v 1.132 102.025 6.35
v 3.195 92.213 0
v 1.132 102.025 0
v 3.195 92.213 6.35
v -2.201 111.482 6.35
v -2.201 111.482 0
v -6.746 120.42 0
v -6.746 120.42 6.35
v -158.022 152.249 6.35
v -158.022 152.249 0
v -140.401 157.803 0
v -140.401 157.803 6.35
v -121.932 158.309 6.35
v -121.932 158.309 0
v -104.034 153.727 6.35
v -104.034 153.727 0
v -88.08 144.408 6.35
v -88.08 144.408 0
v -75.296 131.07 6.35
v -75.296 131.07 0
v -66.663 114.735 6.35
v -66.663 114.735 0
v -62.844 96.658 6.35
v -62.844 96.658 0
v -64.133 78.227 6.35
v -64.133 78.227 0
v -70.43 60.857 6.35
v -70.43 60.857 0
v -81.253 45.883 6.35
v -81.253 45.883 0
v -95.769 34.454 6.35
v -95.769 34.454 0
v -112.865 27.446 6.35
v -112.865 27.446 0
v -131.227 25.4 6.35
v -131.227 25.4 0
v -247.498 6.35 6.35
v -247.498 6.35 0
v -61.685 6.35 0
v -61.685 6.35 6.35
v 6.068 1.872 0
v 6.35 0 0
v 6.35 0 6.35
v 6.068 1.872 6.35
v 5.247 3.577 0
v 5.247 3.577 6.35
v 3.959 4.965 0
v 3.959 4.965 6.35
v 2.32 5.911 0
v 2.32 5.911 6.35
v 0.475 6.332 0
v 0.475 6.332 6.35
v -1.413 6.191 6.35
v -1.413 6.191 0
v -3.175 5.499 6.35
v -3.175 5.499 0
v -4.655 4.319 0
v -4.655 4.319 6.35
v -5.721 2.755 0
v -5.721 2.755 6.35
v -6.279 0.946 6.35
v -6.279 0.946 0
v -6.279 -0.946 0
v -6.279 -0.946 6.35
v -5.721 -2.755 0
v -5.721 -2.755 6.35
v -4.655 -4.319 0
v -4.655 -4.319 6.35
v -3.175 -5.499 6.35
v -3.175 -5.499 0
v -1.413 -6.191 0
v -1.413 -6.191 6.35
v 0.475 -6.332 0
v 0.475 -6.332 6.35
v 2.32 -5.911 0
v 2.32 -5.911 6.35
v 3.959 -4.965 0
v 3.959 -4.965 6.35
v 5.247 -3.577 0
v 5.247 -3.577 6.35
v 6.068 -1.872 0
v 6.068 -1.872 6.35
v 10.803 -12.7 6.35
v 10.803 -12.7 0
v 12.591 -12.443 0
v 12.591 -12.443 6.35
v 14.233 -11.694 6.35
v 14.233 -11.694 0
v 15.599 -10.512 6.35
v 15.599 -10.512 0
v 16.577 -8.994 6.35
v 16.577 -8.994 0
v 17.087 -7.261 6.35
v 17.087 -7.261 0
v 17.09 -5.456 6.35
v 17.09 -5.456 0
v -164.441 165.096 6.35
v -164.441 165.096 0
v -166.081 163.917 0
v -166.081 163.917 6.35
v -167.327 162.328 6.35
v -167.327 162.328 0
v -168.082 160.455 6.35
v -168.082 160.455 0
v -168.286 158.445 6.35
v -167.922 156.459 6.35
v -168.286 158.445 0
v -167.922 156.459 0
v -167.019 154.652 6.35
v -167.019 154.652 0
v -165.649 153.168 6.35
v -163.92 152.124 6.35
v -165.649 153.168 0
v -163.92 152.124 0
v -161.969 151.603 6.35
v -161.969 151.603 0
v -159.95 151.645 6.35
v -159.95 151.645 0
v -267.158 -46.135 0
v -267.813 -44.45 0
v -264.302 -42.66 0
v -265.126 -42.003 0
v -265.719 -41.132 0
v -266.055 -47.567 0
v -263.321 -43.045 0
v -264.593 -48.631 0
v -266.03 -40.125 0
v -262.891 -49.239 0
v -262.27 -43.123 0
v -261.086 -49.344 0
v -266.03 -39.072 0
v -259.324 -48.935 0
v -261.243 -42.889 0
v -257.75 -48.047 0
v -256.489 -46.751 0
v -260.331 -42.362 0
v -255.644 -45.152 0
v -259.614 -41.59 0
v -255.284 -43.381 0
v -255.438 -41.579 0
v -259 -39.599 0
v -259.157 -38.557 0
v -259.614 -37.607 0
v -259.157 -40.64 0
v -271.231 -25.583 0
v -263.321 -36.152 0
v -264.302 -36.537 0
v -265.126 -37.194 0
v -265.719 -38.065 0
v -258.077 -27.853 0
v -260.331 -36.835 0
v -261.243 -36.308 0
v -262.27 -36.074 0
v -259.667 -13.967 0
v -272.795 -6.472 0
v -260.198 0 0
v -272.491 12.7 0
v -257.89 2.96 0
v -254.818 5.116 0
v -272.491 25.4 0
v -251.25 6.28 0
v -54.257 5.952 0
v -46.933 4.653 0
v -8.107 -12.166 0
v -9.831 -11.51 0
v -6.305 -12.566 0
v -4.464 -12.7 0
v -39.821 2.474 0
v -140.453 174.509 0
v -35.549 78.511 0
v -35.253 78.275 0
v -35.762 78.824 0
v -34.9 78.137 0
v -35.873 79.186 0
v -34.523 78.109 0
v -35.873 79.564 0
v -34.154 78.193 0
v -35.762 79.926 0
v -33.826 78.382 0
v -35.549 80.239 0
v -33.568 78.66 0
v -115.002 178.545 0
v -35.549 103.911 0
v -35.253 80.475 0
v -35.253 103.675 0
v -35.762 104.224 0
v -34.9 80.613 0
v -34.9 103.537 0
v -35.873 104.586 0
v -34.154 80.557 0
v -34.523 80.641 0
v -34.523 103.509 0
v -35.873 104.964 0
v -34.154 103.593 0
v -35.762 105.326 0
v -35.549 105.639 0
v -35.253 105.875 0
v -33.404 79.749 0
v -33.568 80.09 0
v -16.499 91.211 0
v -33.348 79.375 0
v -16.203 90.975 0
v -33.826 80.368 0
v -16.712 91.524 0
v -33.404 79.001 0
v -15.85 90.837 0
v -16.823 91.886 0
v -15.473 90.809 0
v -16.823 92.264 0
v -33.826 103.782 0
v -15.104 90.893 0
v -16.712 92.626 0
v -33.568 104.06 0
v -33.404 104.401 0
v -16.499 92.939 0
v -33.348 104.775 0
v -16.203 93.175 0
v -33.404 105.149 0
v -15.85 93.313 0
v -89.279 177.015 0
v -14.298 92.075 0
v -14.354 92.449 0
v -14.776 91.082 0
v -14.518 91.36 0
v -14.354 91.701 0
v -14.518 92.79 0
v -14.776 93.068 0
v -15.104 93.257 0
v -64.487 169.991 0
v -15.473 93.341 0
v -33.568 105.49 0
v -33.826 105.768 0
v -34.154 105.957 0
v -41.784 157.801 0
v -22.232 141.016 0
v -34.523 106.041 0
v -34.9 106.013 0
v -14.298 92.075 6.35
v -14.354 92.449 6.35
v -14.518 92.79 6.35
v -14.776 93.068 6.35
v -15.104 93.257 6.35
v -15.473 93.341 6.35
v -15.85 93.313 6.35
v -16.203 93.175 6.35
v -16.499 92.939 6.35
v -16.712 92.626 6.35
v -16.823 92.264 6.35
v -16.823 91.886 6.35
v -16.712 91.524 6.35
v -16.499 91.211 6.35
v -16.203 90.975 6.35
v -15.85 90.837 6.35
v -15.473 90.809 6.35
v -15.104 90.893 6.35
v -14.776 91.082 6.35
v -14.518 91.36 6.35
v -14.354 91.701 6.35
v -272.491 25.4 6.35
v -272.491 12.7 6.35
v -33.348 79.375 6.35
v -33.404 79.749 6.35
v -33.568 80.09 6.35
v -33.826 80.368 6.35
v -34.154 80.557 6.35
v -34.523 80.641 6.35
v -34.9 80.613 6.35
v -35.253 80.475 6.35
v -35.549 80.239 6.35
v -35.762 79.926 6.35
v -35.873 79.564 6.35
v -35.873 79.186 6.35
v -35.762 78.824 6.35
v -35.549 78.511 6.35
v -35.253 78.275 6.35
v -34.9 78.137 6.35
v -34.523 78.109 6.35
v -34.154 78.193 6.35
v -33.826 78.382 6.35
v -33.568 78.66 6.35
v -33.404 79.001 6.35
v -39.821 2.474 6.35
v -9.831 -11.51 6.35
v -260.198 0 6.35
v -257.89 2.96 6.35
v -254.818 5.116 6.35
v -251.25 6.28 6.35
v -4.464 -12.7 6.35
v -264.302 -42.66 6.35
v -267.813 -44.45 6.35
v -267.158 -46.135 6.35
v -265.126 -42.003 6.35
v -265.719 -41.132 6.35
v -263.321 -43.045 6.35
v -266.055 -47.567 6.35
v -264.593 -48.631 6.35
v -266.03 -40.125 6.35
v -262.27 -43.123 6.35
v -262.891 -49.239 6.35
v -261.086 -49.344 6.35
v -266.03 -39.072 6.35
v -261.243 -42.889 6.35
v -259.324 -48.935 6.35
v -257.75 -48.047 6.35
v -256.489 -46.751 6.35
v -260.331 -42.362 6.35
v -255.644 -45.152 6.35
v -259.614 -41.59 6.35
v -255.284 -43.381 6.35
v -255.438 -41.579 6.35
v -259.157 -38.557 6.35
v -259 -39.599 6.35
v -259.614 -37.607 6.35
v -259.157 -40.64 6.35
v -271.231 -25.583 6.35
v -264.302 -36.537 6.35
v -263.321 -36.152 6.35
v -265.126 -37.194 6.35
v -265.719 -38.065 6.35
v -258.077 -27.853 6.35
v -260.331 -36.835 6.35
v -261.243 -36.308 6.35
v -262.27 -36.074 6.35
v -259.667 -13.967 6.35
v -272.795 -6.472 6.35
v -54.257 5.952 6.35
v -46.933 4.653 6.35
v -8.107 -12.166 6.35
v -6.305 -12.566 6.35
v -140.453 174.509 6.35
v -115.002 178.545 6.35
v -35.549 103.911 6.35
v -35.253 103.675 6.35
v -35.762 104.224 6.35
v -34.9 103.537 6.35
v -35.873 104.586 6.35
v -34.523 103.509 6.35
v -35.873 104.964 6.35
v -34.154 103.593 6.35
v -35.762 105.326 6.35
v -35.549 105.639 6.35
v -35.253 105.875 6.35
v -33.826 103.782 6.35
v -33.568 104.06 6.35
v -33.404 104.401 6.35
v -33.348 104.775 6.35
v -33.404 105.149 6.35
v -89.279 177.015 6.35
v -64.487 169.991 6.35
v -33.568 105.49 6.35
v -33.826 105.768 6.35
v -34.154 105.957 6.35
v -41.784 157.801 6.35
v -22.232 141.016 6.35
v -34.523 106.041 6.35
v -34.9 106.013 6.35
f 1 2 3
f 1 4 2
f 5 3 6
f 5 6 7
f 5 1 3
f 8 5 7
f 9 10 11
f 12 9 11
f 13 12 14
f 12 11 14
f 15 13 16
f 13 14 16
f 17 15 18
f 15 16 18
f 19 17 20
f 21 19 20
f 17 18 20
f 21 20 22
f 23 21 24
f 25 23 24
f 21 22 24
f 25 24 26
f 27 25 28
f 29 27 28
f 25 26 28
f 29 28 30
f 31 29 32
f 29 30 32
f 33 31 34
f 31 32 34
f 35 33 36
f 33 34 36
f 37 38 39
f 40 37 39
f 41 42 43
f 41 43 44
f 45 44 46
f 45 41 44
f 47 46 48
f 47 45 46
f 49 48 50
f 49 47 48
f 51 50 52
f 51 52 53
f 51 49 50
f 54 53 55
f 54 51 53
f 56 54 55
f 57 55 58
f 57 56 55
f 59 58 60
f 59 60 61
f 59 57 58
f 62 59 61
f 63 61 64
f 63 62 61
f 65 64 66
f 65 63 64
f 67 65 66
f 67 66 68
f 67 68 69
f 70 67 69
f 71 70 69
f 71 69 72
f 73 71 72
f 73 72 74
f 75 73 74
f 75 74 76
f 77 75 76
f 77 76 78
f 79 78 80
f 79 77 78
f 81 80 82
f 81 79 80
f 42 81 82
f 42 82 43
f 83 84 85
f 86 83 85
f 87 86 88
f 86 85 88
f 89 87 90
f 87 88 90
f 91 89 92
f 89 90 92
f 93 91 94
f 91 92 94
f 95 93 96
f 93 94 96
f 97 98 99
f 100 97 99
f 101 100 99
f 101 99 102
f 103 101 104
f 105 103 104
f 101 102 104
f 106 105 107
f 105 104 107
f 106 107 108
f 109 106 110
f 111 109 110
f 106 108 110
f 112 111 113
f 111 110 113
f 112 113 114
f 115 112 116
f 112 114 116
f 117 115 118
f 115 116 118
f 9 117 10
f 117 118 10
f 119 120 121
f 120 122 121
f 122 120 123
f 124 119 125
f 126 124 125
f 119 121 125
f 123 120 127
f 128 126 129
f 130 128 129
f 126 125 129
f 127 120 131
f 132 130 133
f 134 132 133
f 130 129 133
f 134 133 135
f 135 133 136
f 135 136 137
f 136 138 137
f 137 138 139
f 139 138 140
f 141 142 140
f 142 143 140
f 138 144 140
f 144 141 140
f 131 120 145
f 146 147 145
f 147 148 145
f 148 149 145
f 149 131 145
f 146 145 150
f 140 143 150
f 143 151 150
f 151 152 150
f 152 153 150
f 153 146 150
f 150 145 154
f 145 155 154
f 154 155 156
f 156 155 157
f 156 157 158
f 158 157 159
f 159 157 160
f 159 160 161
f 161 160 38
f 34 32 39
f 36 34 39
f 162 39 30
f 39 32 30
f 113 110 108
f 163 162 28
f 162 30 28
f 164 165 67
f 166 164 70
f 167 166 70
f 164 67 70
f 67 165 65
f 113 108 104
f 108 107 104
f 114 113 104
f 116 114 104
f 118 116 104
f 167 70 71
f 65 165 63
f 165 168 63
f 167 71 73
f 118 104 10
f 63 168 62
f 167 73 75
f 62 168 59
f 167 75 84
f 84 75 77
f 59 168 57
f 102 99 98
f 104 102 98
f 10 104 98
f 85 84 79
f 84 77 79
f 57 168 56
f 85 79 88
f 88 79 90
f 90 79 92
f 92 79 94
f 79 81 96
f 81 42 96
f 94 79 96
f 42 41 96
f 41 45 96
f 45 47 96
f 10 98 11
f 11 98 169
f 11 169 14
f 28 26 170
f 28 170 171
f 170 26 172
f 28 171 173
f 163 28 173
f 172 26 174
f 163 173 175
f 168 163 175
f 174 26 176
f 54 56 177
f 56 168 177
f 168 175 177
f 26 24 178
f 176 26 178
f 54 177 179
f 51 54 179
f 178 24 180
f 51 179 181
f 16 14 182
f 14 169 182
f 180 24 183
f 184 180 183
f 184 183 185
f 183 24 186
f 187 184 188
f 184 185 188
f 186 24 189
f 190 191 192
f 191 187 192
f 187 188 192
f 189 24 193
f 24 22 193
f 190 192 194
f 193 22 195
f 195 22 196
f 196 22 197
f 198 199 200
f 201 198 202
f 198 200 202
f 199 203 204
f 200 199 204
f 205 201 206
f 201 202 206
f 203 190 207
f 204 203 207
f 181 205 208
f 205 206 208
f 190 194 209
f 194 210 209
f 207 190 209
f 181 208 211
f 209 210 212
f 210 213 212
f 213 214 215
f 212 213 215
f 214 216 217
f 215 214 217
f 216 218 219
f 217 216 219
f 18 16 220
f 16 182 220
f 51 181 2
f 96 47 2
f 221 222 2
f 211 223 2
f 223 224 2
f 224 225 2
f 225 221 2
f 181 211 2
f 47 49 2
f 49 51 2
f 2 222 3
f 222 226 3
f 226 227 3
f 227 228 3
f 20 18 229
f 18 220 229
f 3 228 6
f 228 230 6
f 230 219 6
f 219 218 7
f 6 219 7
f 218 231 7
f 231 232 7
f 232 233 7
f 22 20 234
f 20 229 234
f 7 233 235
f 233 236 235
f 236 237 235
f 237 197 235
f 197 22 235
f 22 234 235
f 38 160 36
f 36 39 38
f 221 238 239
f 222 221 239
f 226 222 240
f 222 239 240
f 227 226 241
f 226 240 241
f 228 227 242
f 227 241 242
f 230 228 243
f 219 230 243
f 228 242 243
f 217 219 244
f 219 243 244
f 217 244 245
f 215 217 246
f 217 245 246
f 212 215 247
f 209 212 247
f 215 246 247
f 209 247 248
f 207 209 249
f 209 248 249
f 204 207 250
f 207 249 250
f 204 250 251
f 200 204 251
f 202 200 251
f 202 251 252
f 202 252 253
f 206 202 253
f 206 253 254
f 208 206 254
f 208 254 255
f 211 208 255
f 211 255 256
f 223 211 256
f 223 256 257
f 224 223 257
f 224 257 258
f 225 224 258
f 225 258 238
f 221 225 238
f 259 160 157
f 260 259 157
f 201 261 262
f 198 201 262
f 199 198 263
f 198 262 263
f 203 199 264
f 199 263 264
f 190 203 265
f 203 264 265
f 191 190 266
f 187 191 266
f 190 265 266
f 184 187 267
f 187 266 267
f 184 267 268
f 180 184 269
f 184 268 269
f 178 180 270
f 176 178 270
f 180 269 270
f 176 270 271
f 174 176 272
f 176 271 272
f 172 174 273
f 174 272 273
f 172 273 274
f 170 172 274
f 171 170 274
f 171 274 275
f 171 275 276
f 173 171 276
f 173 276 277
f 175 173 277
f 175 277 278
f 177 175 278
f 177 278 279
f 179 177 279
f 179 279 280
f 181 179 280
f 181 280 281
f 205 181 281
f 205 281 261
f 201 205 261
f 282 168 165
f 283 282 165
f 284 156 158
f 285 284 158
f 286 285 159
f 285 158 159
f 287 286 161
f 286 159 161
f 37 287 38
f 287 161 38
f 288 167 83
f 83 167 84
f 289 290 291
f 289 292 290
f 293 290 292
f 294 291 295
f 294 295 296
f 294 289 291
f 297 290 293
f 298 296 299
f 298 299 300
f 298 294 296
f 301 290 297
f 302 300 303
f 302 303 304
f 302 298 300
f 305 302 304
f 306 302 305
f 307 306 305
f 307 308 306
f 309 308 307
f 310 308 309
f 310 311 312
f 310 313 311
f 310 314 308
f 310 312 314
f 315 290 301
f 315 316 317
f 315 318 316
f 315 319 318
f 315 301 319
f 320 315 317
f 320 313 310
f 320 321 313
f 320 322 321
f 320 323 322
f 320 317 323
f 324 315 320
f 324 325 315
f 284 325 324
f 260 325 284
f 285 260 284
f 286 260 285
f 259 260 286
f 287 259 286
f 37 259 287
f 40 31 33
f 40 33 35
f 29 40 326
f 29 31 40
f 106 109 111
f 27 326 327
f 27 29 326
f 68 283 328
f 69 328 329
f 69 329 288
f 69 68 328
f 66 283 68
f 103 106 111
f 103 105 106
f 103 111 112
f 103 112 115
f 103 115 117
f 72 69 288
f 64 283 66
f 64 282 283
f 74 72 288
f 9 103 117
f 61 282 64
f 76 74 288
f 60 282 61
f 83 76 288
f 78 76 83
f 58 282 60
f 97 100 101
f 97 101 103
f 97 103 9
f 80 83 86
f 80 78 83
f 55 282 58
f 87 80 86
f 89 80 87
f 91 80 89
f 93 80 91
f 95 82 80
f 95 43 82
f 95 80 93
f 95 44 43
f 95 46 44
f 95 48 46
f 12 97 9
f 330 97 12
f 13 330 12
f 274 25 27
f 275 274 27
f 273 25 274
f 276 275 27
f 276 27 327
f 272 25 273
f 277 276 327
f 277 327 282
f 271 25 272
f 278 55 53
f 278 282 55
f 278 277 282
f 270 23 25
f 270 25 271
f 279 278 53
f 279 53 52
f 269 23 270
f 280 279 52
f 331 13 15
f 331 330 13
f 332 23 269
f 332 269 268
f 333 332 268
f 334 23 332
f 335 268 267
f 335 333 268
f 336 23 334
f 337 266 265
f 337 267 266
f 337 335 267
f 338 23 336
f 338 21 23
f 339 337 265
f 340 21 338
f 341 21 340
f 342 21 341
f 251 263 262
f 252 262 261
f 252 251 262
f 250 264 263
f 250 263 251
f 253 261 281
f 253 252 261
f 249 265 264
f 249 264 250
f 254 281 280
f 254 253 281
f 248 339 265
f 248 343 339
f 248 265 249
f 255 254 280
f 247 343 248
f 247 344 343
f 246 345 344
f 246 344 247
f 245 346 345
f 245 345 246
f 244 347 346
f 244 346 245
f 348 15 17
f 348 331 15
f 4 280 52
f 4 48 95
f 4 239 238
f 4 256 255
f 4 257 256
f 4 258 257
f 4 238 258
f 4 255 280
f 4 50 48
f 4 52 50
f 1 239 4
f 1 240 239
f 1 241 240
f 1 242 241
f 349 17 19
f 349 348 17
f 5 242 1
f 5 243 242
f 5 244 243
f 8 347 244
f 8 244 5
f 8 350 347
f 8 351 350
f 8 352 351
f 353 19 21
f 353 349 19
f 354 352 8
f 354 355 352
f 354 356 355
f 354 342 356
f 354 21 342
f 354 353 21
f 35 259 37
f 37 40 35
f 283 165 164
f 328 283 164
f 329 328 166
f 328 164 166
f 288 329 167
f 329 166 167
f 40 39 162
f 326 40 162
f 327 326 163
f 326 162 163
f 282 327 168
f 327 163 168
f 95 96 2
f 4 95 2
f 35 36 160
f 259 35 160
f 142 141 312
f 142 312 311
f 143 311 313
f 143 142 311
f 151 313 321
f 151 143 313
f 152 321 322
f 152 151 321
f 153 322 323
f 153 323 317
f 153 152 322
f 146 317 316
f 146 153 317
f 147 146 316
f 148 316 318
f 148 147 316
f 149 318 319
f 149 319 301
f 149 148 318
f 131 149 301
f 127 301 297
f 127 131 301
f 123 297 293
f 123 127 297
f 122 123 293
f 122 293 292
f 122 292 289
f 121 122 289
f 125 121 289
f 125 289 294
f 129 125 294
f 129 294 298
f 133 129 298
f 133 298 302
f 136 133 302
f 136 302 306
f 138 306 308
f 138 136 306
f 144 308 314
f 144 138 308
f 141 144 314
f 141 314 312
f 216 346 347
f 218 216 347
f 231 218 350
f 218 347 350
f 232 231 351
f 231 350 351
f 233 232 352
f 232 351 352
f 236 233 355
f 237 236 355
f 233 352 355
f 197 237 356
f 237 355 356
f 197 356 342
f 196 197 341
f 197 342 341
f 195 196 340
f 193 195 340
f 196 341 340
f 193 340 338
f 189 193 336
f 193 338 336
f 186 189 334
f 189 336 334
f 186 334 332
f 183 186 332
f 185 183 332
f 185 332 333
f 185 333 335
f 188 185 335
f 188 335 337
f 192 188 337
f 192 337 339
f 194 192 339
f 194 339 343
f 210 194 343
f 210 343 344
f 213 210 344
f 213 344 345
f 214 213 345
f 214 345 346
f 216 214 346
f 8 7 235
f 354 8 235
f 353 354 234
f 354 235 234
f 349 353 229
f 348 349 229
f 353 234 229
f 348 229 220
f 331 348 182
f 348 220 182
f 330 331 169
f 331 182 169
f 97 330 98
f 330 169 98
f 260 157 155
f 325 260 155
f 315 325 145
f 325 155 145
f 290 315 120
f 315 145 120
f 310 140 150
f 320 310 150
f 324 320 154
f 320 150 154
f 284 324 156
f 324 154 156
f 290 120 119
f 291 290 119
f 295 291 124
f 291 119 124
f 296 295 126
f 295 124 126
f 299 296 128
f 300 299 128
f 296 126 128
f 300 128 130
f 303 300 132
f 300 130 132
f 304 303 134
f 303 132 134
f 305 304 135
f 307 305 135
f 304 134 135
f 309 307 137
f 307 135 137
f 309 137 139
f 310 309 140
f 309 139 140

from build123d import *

# Parameters (mm, degrees)
SKETCH12_R          = 3.534772165
SKETCH12_R_2        = 6.35
BOSS_EXTRUDE1_DEPTH = 6.35
FILLET1_R           = 76.2
CUT_EXTRUDE1_REACH  = 328.259
SKETCH13_R          = 1.27


with BuildPart() as part:
    # Sketch12 → Boss-Extrude1 (new body)
    with BuildSketch(Plane.XY):
        with BuildLine():
            Line((-39.821029206, 2.474307267), (-9.831351966, -11.510108895))
            ThreePointArc((-9.831351966, -11.510108895), (-7.212883139, -12.39895929), (-4.464100042, -12.7))
            Line((-4.464100042, -12.7), (10.803041567, -12.7))
            ThreePointArc((10.803041567, -12.7), (15.59897105, -10.511917874), (17.089739091, -5.455609571))
            Line((17.089739091, -5.455609571), (1.595718556, 103.452331978))
            ThreePointArc((1.595718556, 103.452331978), (-67.699436665, 171.237030889), (-164.440692675, 165.095912987))
            ThreePointArc((-164.440692675, 165.095912987), (-167.534473509, 155.523319718), (-158.02225004, 152.248624859))
            ThreePointArc((-158.02225004, 152.248624859), (-64.124270807, 105.829190753), (-131.226727106, 25.4))
            Line((-131.226727106, 25.4), (-272.4912, 25.4))
            Line((-272.4912, 25.4), (-272.4912, 12.7))
            ThreePointArc((-272.4912, 12.7), (-272.246013191, -16.046367487), (-267.813472119, -44.45))
            ThreePointArc((-267.813472119, -44.45), (-260.190367935, -49.202291704), (-255.438076231, -41.579187519))
            ThreePointArc((-255.438076231, -41.579187519), (-259.003846596, -20.925354843), (-260.1976, 0))
            ThreePointArc((-260.1976, 0), (-254.817926624, 5.115653247), (-247.4976, 6.35))
            Line((-247.4976, 6.35), (-61.685028221, 6.35))
            ThreePointArc((-61.685028221, 6.35), (-50.5754306, 5.414040325), (-39.821029206, 2.474307267))
        make_face()
        with Locations((-262.5344, -39.5986)):
            Circle(SKETCH12_R, mode=Mode.SUBTRACT)
        Circle(SKETCH12_R_2, mode=Mode.SUBTRACT)
    extrude(amount=BOSS_EXTRUDE1_DEPTH)

    # Fillet1
    fillet1_edges = [part.edges().sort_by_distance(p)[0] for p in [
        (1.595718556, 103.452331978, 3.175),
    ]]
    fillet(fillet1_edges, radius=FILLET1_R)

    # Sketch13 → Cut-Extrude1 (cut, up to next)
    with BuildSketch(Plane.XY.offset(6.35), mode=Mode.PRIVATE) as cut_extrude1_sk1:
        with Locations((-15.567641436, 92.075)):
            Circle(SKETCH13_R)
    cut_extrude1_tool1 = extrude(cut_extrude1_sk1.sketch, amount=-CUT_EXTRUDE1_REACH, mode=Mode.PRIVATE) & part.part
    # Sketch13 → Cut-Extrude1 (cut, up to next)
    with BuildSketch(Plane.XY.offset(6.35), mode=Mode.PRIVATE) as cut_extrude1_sk2:
        with Locations((-34.617641436, 104.775)):
            Circle(SKETCH13_R)
    cut_extrude1_tool2 = extrude(cut_extrude1_sk2.sketch, amount=-CUT_EXTRUDE1_REACH, mode=Mode.PRIVATE) & part.part
    # Sketch13 → Cut-Extrude1 (cut, up to next)
    with BuildSketch(Plane.XY.offset(6.35), mode=Mode.PRIVATE) as cut_extrude1_sk3:
        with Locations((-34.617641436, 79.375)):
            Circle(SKETCH13_R)
    cut_extrude1_tool3 = extrude(cut_extrude1_sk3.sketch, amount=-CUT_EXTRUDE1_REACH, mode=Mode.PRIVATE) & part.part
    add(cut_extrude1_tool1.solids().sort_by_distance((-15.567641, 92.075, 6.35))[0], mode=Mode.SUBTRACT)
    add(cut_extrude1_tool2.solids().sort_by_distance((-34.617641, 104.775, 6.35))[0], mode=Mode.SUBTRACT)
    add(cut_extrude1_tool3.solids().sort_by_distance((-34.617641, 79.375, 6.35))[0], mode=Mode.SUBTRACT)


solid = part.part
